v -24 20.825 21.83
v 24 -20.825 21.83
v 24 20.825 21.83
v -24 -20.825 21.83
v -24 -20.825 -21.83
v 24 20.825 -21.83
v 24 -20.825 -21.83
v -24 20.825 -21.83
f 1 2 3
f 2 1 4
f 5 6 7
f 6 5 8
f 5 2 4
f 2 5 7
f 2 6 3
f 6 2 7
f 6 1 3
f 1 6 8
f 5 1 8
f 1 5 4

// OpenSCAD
// Parametric model generated from 3MF mesh
// Generated: Automated conversion tool

// === PARAMETERS ===
// Main dimensions
overall_width = 48.00;
overall_depth = 41.65;
overall_height = 43.66;

// Bounding box reference
min_x = -24.00;
min_y = -20.82;
min_z = -21.83;

// Rendering quality
$fn = 50;  // Increase for smoother circles

// === MODEL ===
module main_body() {
    // Base rectangular body
    translate([0.00, 0.00, 0.00])
        cube([overall_width, overall_depth, overall_height], center=true);
}


// === ASSEMBLY ===
union() {
    main_body();
}
